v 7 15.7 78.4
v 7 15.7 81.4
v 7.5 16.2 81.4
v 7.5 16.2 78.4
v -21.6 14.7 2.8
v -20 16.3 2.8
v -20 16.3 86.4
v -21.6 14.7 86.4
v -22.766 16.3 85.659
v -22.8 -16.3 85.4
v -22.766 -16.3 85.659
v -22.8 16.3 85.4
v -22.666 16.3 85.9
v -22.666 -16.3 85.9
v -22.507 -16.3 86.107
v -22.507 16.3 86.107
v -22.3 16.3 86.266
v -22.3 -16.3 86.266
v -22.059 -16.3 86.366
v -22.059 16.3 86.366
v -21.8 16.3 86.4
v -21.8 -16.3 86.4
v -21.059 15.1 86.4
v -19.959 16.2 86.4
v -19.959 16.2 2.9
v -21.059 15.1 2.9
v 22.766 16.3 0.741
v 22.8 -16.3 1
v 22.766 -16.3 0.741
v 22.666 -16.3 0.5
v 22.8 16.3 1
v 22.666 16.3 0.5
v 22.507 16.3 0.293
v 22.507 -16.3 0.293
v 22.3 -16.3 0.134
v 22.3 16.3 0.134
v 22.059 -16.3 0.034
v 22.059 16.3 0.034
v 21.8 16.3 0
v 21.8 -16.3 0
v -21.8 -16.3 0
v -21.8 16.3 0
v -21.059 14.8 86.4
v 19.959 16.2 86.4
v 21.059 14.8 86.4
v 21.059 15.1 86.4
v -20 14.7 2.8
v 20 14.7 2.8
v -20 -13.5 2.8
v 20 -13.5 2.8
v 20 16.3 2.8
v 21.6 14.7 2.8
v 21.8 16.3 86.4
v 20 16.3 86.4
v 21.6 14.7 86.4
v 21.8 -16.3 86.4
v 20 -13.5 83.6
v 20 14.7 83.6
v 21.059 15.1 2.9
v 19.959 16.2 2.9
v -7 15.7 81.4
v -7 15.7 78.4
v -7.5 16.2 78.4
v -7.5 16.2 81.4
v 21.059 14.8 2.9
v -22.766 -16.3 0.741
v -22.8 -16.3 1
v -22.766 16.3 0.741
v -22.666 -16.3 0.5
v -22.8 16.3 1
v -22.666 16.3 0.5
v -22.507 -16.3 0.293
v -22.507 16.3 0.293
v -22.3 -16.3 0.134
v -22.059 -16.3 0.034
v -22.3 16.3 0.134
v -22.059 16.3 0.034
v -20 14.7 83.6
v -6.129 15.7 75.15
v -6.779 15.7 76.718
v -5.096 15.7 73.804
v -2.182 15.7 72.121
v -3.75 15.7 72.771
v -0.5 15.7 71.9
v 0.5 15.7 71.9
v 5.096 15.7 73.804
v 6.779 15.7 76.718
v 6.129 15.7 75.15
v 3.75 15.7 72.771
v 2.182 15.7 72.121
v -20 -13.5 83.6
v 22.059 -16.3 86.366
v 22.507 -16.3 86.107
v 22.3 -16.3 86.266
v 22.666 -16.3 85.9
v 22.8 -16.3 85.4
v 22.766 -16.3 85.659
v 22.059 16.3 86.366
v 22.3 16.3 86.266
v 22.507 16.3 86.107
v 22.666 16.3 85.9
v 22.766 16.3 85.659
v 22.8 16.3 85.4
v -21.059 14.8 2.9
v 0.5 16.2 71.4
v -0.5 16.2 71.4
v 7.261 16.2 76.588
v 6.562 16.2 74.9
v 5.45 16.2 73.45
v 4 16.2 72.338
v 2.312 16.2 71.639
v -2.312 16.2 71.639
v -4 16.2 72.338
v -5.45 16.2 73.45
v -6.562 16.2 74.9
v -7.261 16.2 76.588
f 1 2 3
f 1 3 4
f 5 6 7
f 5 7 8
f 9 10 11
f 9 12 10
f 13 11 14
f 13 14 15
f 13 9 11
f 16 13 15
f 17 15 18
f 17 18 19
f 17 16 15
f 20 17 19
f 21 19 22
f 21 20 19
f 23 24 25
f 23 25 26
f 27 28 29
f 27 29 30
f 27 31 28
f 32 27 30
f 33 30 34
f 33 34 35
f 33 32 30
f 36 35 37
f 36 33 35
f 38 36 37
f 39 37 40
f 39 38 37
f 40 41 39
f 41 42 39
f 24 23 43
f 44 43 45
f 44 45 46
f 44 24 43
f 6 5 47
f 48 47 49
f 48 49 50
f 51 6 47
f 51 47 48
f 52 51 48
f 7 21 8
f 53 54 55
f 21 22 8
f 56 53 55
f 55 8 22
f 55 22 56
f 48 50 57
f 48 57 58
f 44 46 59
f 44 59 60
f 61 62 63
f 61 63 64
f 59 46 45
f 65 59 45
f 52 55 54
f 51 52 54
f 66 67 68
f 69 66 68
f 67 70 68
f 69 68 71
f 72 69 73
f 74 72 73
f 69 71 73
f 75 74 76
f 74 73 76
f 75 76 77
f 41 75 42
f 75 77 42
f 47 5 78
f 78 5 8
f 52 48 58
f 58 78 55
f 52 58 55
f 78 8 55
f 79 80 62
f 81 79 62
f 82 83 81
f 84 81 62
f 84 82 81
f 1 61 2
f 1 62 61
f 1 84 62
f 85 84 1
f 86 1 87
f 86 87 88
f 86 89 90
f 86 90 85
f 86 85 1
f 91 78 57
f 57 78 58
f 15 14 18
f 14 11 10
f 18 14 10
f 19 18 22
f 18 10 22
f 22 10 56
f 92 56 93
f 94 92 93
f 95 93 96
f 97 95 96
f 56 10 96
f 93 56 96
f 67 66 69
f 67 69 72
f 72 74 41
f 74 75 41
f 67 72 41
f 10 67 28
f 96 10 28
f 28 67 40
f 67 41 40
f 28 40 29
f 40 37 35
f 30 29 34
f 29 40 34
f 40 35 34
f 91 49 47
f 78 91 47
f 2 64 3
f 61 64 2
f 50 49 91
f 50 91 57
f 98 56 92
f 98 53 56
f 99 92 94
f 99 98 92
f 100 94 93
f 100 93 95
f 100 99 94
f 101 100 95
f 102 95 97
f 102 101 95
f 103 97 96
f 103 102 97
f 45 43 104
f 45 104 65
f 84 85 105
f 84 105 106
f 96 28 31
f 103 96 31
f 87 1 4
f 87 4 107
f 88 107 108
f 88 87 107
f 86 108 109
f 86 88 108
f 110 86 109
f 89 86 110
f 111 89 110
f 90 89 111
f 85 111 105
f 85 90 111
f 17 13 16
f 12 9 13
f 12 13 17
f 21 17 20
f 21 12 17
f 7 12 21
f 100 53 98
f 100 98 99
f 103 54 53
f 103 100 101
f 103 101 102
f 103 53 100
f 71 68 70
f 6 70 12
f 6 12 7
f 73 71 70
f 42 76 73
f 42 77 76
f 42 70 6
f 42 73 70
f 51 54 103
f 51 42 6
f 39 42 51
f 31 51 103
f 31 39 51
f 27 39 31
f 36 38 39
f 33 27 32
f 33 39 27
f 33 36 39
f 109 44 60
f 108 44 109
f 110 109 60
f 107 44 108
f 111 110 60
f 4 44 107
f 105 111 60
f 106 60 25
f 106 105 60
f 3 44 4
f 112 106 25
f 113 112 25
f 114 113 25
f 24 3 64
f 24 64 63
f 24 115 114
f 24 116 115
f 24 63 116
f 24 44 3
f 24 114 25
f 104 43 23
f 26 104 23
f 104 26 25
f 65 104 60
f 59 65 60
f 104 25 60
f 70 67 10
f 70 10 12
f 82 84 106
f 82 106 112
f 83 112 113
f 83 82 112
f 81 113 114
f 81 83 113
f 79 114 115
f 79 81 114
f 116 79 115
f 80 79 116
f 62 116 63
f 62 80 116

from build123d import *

# Parameters (mm, degrees)
SKETCH1_W           = 45.6
SKETCH1_H           = 32.6
BOSS_EXTRUDE1_DEPTH = 86.4
SHELL1_T            = -2.8
CUT_EXTRUDE1_DEPTH  = 83.6
BOSS_EXTRUDE2_DEPTH = 83.5
SKETCH5_W           = 15
SKETCH5_H           = 10
CUT_EXTRUDE3_DEPTH  = 0.5
FILLET1_R           = 7
CHAMFER1_SIZE       = 0.5
FILLET2_R           = 1
CUT_EXTRUDE4_DEPTH  = 83.5


with BuildPart() as part:
    # Sketch1 → Boss-Extrude1 (new body)
    with BuildSketch(Plane.XY):
        Rectangle(SKETCH1_W, SKETCH1_H)
    extrude(amount=BOSS_EXTRUDE1_DEPTH)

    # Shell1
    shell1_openings = [part.faces().sort_by_distance(p)[0] for p in [
        (0, 16.3, 43.2),
    ]]
    offset(amount=SHELL1_T, openings=shell1_openings, kind=Kind.INTERSECTION)

    # Sketch2 → Cut-Extrude1 (cut)
    with BuildSketch(Plane.XY.offset(86.4)):
        Polygon((20, 16.3), (-20, 16.3), (-21.6, 14.7), (21.6, 14.7), align=None)
    extrude(amount=-CUT_EXTRUDE1_DEPTH, mode=Mode.SUBTRACT)

    # Fillet2
    fillet2_edges = [part.edges().sort_by_distance(p)[0] for p in [
        (-22.8, 0, 86.4),
        (22.8, 0, 86.4),
        (-22.8, 0, 0),
        (22.8, 0, 0),
    ]]
    fillet(fillet2_edges, radius=FILLET2_R)


with BuildPart() as body_2:
    # Sketch3 → Boss-Extrude2 (new body)
    with BuildSketch(Plane.XY.offset(86.4)):
        Polygon((19.958578644, 16.2), (-19.958578644, 16.2), (-21.358578644, 14.8), (21.358578644, 14.8), align=None)
    extrude(amount=-BOSS_EXTRUDE2_DEPTH)

    # Sketch5 → Cut-Extrude3 (cut)
    with BuildSketch(Plane(origin=(0, 16.2, 0), x_dir=(1, 0, 0), z_dir=(0, 1, 0))):
        with Locations((0, -76.4)):
            Rectangle(SKETCH5_W, SKETCH5_H)
    extrude(amount=-CUT_EXTRUDE3_DEPTH, mode=Mode.SUBTRACT)

    # Fillet1
    fillet1_edges = [body_2.edges().sort_by_distance(p)[0] for p in [
        (7.5, 15.95, 71.4),
        (-7.5, 15.95, 71.4),
    ]]
    fillet(fillet1_edges, radius=FILLET1_R)

    # Chamfer1
    chamfer1_edges = [body_2.edges().sort_by_distance(p)[0] for p in [
        (7.5, 15.7, 79.9),
        (5.449747468, 15.7, 73.450252532),
        (0, 15.7, 71.4),
        (-7.5, 15.7, 79.9),
        (-5.449747468, 15.7, 73.450252532),
    ]]
    chamfer(chamfer1_edges, length=CHAMFER1_SIZE - 0.0001)  # a hair under: the kernel refuses the full size

    # Sketch6 → Cut-Extrude4 (cut)
    with BuildSketch(Plane.XY.offset(86.4)):
        Polygon((-21.058578644, 15.1), (-21.358578644, 14.8), (-21.058578644, 14.8), align=None)
        Polygon((21.058578644, 15.1), (21.058578644, 14.8), (21.358578644, 14.8), align=None)
    extrude(amount=-CUT_EXTRUDE4_DEPTH, mode=Mode.SUBTRACT)


solid = Compound([part.part, body_2.part])
